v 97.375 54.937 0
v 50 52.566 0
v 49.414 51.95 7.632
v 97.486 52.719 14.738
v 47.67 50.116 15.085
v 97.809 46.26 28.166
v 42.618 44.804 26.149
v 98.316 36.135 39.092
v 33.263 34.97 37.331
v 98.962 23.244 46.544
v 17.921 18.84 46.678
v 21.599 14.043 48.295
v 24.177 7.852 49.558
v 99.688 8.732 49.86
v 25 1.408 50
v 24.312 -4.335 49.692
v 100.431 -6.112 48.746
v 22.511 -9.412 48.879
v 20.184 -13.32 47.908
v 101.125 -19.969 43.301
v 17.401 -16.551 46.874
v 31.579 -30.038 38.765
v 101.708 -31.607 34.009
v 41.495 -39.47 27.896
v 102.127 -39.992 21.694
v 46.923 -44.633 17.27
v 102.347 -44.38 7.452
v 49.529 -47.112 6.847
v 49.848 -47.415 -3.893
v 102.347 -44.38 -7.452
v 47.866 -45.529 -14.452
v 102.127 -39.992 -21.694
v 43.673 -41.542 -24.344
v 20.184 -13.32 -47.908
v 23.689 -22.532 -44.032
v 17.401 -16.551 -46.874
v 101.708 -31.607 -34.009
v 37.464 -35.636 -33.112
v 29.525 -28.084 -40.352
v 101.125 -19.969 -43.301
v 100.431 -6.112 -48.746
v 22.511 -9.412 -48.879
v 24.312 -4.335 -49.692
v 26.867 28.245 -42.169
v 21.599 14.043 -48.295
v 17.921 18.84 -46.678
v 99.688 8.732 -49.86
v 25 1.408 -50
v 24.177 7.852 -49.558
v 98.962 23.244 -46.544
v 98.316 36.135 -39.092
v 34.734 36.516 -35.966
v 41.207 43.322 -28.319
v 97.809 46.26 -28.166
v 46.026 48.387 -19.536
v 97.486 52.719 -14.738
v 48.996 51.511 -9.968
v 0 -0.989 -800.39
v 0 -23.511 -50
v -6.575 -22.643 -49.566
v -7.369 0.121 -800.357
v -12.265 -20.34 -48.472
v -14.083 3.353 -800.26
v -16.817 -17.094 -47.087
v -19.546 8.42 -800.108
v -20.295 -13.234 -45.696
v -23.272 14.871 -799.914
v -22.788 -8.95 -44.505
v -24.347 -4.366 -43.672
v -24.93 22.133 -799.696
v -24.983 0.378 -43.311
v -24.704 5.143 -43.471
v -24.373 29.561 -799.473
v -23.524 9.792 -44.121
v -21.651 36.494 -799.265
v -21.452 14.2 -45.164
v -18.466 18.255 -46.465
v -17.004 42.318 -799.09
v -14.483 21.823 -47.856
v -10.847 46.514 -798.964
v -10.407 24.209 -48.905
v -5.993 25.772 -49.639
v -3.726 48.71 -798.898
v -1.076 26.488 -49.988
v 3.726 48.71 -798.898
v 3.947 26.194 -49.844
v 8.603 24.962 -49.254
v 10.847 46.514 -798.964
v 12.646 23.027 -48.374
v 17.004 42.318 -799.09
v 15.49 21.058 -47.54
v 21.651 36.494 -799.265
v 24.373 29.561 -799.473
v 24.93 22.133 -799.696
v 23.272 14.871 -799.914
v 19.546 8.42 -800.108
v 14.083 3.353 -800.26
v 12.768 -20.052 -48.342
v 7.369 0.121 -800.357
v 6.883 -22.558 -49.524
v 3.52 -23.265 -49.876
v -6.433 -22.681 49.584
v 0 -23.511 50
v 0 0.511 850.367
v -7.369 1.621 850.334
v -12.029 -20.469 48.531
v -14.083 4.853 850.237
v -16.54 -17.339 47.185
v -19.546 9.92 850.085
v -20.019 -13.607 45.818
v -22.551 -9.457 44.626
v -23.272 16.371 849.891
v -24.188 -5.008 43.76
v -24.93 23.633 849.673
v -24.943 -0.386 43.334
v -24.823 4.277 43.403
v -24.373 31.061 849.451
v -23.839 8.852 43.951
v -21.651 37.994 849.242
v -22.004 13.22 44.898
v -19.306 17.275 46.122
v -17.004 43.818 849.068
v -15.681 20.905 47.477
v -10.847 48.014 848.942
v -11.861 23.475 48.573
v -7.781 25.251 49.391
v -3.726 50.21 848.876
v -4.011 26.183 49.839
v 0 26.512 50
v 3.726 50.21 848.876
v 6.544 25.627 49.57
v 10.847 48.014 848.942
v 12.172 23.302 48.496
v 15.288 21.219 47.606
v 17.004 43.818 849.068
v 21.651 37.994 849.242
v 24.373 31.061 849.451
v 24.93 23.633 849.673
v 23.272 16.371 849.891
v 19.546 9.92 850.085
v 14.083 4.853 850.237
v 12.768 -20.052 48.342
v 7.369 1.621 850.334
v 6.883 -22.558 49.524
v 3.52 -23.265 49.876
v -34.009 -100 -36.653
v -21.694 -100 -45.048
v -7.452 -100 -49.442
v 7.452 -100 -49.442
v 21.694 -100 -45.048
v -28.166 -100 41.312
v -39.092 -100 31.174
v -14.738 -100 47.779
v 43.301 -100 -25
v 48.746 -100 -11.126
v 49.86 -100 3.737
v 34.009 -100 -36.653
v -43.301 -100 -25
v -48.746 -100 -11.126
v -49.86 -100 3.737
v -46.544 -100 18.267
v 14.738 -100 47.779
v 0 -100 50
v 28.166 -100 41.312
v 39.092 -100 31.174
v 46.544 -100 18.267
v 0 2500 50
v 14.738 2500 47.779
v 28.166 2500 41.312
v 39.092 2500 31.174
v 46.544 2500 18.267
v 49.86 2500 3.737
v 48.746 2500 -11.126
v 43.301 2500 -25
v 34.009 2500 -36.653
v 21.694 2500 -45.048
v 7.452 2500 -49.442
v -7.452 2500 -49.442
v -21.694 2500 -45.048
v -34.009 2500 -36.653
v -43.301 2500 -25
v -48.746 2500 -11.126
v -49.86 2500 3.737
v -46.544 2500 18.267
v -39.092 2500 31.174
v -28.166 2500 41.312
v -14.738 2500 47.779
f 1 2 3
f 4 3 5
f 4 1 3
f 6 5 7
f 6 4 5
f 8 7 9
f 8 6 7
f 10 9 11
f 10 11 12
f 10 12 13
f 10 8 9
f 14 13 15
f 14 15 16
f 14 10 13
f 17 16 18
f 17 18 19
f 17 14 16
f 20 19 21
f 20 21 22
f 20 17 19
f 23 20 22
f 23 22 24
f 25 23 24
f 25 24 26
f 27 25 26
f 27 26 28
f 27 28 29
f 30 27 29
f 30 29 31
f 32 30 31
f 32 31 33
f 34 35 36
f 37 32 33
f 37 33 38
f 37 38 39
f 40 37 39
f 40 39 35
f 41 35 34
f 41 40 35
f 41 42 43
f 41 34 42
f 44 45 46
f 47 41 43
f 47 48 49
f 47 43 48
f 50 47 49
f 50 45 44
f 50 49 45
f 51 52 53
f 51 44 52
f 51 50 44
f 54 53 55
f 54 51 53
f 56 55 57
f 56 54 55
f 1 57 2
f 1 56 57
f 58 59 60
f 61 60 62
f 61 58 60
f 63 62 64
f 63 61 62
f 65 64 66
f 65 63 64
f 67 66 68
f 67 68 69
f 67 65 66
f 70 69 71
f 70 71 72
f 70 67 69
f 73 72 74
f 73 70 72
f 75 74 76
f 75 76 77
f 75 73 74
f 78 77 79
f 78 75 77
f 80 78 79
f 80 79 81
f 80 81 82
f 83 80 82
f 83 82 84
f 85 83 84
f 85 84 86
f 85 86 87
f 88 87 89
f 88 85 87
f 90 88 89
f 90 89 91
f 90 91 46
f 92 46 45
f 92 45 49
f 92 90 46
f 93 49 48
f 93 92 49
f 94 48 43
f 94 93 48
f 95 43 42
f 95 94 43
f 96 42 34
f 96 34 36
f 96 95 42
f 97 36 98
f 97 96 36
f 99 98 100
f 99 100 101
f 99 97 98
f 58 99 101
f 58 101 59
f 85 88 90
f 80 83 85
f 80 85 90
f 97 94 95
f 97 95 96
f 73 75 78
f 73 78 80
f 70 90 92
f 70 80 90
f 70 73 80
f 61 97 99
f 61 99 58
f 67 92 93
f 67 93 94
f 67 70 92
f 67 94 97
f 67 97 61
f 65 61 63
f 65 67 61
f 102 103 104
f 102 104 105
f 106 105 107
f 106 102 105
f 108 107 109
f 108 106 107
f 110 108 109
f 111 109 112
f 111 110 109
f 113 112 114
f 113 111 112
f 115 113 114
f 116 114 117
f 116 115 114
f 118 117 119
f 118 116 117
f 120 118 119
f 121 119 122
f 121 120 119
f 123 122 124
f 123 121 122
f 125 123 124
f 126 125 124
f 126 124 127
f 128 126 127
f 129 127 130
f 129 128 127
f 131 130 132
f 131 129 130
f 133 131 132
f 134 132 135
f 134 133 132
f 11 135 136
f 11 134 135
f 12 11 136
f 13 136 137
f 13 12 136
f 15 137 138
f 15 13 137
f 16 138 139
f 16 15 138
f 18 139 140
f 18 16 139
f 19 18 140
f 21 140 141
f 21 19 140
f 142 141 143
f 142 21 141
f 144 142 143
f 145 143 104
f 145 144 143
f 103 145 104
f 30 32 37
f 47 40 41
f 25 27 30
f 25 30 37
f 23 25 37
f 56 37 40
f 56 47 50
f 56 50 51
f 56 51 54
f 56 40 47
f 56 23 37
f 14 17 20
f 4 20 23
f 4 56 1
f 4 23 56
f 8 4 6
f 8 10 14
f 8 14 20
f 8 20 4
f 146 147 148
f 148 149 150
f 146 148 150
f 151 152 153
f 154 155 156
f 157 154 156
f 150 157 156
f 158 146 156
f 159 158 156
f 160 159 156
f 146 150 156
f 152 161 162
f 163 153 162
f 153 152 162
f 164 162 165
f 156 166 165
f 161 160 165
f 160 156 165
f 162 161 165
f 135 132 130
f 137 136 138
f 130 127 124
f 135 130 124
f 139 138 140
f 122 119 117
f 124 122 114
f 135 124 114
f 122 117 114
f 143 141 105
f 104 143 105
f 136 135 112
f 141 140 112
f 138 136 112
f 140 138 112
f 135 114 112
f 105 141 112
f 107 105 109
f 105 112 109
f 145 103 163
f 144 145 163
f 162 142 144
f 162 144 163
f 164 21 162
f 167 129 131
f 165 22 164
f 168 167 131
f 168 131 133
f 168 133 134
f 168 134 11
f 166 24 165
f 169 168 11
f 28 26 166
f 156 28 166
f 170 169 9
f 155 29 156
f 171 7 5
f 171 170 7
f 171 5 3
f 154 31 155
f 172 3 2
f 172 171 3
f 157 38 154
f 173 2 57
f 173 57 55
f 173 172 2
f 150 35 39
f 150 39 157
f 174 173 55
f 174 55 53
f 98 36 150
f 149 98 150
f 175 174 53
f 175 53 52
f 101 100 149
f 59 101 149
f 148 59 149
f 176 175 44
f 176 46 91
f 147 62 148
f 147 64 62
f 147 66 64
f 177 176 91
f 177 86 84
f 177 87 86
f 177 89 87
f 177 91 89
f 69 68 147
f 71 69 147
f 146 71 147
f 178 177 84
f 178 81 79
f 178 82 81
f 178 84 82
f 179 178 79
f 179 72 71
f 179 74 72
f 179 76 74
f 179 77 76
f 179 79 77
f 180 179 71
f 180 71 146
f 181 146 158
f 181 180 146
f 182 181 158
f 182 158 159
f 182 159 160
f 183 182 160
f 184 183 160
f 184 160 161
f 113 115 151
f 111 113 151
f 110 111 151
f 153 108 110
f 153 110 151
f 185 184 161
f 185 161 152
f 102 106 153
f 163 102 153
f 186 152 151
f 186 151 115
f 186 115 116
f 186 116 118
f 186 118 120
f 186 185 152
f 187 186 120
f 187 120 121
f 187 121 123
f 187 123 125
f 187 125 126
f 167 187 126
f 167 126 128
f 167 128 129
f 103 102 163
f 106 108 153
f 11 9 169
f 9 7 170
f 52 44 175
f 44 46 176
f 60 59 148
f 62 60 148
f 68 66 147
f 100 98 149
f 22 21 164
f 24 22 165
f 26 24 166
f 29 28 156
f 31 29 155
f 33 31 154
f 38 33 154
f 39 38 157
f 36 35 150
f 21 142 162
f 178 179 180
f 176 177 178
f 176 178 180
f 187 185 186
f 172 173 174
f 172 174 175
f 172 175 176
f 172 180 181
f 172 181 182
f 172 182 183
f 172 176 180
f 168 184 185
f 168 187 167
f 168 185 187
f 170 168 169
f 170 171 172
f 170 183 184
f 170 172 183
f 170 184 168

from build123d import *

# Parameters (mm, degrees)
SWEEP_100_PROFILE_R = 50
SWEEP_515_PROFILE_R = 25
SWEEP_585_PROFILE_R = 25
SWEEP_641_PROFILE_R = 50


with BuildPart() as part:
    # труба 100: sweep along a curve in space
    with BuildLine() as sweep_100_path:
        Line((0, -100, 0), (0, 2500, 0))
    # труба 100 profile (on start of the path) → труба 100 (sweep)
    with BuildSketch(Plane.ZX.offset(-100)):
        Circle(SWEEP_100_PROFILE_R)
    sweep(path=sweep_100_path.line)

    # Sweep 515: sweep along a curve in space
    with BuildLine() as sweep_515_path:
        Line((0, 25.5, 849.617413899), (0, 0, 0))
    # Sweep 515 profile (on start of the path) → Sweep 515 (sweep)
    with BuildSketch(Plane(origin=(0, 25.5, 849.617413899), x_dir=(0, -0.9995498987044119, 0.030000000000000002), z_dir=(0, -0.030000000000000002, -0.9995498987044119))):
        Circle(SWEEP_515_PROFILE_R)
    sweep(path=sweep_515_path.line)



with BuildPart() as body_2:
    # Sweep 585: sweep along a curve in space
    with BuildLine() as sweep_585_path:
        Line((0, 0, 0), (0, 24, -799.639918964))
    # Sweep 585 profile (on start of the path) → Sweep 585 (sweep)
    with BuildSketch(Plane(origin=(0, 0, 0), x_dir=(0, -0.9995498987044119, -0.03), z_dir=(0, 0.03, -0.9995498987044119))):
        Circle(SWEEP_585_PROFILE_R)
    sweep(path=sweep_585_path.line)


with BuildPart() as part_1:
    add(part.part)

    add(body_2.part)  # Sweep 641 merges body 2
    # Sweep 641: sweep along a curve in space
    with BuildLine() as sweep_641_path:
        Line((0, 0, 0), (99.874921777, 5, 0))
    # Sweep 641 profile (on start of the path) → Sweep 641 (sweep)
    with BuildSketch(Plane(origin=(0, 0, 0), x_dir=(-0.04999999999999999, 0.998749217771909, 0), z_dir=(0.998749217771909, 0.04999999999999999, 0))):
        Circle(SWEEP_641_PROFILE_R)
    sweep(path=sweep_641_path.line)


solid = part_1.part
